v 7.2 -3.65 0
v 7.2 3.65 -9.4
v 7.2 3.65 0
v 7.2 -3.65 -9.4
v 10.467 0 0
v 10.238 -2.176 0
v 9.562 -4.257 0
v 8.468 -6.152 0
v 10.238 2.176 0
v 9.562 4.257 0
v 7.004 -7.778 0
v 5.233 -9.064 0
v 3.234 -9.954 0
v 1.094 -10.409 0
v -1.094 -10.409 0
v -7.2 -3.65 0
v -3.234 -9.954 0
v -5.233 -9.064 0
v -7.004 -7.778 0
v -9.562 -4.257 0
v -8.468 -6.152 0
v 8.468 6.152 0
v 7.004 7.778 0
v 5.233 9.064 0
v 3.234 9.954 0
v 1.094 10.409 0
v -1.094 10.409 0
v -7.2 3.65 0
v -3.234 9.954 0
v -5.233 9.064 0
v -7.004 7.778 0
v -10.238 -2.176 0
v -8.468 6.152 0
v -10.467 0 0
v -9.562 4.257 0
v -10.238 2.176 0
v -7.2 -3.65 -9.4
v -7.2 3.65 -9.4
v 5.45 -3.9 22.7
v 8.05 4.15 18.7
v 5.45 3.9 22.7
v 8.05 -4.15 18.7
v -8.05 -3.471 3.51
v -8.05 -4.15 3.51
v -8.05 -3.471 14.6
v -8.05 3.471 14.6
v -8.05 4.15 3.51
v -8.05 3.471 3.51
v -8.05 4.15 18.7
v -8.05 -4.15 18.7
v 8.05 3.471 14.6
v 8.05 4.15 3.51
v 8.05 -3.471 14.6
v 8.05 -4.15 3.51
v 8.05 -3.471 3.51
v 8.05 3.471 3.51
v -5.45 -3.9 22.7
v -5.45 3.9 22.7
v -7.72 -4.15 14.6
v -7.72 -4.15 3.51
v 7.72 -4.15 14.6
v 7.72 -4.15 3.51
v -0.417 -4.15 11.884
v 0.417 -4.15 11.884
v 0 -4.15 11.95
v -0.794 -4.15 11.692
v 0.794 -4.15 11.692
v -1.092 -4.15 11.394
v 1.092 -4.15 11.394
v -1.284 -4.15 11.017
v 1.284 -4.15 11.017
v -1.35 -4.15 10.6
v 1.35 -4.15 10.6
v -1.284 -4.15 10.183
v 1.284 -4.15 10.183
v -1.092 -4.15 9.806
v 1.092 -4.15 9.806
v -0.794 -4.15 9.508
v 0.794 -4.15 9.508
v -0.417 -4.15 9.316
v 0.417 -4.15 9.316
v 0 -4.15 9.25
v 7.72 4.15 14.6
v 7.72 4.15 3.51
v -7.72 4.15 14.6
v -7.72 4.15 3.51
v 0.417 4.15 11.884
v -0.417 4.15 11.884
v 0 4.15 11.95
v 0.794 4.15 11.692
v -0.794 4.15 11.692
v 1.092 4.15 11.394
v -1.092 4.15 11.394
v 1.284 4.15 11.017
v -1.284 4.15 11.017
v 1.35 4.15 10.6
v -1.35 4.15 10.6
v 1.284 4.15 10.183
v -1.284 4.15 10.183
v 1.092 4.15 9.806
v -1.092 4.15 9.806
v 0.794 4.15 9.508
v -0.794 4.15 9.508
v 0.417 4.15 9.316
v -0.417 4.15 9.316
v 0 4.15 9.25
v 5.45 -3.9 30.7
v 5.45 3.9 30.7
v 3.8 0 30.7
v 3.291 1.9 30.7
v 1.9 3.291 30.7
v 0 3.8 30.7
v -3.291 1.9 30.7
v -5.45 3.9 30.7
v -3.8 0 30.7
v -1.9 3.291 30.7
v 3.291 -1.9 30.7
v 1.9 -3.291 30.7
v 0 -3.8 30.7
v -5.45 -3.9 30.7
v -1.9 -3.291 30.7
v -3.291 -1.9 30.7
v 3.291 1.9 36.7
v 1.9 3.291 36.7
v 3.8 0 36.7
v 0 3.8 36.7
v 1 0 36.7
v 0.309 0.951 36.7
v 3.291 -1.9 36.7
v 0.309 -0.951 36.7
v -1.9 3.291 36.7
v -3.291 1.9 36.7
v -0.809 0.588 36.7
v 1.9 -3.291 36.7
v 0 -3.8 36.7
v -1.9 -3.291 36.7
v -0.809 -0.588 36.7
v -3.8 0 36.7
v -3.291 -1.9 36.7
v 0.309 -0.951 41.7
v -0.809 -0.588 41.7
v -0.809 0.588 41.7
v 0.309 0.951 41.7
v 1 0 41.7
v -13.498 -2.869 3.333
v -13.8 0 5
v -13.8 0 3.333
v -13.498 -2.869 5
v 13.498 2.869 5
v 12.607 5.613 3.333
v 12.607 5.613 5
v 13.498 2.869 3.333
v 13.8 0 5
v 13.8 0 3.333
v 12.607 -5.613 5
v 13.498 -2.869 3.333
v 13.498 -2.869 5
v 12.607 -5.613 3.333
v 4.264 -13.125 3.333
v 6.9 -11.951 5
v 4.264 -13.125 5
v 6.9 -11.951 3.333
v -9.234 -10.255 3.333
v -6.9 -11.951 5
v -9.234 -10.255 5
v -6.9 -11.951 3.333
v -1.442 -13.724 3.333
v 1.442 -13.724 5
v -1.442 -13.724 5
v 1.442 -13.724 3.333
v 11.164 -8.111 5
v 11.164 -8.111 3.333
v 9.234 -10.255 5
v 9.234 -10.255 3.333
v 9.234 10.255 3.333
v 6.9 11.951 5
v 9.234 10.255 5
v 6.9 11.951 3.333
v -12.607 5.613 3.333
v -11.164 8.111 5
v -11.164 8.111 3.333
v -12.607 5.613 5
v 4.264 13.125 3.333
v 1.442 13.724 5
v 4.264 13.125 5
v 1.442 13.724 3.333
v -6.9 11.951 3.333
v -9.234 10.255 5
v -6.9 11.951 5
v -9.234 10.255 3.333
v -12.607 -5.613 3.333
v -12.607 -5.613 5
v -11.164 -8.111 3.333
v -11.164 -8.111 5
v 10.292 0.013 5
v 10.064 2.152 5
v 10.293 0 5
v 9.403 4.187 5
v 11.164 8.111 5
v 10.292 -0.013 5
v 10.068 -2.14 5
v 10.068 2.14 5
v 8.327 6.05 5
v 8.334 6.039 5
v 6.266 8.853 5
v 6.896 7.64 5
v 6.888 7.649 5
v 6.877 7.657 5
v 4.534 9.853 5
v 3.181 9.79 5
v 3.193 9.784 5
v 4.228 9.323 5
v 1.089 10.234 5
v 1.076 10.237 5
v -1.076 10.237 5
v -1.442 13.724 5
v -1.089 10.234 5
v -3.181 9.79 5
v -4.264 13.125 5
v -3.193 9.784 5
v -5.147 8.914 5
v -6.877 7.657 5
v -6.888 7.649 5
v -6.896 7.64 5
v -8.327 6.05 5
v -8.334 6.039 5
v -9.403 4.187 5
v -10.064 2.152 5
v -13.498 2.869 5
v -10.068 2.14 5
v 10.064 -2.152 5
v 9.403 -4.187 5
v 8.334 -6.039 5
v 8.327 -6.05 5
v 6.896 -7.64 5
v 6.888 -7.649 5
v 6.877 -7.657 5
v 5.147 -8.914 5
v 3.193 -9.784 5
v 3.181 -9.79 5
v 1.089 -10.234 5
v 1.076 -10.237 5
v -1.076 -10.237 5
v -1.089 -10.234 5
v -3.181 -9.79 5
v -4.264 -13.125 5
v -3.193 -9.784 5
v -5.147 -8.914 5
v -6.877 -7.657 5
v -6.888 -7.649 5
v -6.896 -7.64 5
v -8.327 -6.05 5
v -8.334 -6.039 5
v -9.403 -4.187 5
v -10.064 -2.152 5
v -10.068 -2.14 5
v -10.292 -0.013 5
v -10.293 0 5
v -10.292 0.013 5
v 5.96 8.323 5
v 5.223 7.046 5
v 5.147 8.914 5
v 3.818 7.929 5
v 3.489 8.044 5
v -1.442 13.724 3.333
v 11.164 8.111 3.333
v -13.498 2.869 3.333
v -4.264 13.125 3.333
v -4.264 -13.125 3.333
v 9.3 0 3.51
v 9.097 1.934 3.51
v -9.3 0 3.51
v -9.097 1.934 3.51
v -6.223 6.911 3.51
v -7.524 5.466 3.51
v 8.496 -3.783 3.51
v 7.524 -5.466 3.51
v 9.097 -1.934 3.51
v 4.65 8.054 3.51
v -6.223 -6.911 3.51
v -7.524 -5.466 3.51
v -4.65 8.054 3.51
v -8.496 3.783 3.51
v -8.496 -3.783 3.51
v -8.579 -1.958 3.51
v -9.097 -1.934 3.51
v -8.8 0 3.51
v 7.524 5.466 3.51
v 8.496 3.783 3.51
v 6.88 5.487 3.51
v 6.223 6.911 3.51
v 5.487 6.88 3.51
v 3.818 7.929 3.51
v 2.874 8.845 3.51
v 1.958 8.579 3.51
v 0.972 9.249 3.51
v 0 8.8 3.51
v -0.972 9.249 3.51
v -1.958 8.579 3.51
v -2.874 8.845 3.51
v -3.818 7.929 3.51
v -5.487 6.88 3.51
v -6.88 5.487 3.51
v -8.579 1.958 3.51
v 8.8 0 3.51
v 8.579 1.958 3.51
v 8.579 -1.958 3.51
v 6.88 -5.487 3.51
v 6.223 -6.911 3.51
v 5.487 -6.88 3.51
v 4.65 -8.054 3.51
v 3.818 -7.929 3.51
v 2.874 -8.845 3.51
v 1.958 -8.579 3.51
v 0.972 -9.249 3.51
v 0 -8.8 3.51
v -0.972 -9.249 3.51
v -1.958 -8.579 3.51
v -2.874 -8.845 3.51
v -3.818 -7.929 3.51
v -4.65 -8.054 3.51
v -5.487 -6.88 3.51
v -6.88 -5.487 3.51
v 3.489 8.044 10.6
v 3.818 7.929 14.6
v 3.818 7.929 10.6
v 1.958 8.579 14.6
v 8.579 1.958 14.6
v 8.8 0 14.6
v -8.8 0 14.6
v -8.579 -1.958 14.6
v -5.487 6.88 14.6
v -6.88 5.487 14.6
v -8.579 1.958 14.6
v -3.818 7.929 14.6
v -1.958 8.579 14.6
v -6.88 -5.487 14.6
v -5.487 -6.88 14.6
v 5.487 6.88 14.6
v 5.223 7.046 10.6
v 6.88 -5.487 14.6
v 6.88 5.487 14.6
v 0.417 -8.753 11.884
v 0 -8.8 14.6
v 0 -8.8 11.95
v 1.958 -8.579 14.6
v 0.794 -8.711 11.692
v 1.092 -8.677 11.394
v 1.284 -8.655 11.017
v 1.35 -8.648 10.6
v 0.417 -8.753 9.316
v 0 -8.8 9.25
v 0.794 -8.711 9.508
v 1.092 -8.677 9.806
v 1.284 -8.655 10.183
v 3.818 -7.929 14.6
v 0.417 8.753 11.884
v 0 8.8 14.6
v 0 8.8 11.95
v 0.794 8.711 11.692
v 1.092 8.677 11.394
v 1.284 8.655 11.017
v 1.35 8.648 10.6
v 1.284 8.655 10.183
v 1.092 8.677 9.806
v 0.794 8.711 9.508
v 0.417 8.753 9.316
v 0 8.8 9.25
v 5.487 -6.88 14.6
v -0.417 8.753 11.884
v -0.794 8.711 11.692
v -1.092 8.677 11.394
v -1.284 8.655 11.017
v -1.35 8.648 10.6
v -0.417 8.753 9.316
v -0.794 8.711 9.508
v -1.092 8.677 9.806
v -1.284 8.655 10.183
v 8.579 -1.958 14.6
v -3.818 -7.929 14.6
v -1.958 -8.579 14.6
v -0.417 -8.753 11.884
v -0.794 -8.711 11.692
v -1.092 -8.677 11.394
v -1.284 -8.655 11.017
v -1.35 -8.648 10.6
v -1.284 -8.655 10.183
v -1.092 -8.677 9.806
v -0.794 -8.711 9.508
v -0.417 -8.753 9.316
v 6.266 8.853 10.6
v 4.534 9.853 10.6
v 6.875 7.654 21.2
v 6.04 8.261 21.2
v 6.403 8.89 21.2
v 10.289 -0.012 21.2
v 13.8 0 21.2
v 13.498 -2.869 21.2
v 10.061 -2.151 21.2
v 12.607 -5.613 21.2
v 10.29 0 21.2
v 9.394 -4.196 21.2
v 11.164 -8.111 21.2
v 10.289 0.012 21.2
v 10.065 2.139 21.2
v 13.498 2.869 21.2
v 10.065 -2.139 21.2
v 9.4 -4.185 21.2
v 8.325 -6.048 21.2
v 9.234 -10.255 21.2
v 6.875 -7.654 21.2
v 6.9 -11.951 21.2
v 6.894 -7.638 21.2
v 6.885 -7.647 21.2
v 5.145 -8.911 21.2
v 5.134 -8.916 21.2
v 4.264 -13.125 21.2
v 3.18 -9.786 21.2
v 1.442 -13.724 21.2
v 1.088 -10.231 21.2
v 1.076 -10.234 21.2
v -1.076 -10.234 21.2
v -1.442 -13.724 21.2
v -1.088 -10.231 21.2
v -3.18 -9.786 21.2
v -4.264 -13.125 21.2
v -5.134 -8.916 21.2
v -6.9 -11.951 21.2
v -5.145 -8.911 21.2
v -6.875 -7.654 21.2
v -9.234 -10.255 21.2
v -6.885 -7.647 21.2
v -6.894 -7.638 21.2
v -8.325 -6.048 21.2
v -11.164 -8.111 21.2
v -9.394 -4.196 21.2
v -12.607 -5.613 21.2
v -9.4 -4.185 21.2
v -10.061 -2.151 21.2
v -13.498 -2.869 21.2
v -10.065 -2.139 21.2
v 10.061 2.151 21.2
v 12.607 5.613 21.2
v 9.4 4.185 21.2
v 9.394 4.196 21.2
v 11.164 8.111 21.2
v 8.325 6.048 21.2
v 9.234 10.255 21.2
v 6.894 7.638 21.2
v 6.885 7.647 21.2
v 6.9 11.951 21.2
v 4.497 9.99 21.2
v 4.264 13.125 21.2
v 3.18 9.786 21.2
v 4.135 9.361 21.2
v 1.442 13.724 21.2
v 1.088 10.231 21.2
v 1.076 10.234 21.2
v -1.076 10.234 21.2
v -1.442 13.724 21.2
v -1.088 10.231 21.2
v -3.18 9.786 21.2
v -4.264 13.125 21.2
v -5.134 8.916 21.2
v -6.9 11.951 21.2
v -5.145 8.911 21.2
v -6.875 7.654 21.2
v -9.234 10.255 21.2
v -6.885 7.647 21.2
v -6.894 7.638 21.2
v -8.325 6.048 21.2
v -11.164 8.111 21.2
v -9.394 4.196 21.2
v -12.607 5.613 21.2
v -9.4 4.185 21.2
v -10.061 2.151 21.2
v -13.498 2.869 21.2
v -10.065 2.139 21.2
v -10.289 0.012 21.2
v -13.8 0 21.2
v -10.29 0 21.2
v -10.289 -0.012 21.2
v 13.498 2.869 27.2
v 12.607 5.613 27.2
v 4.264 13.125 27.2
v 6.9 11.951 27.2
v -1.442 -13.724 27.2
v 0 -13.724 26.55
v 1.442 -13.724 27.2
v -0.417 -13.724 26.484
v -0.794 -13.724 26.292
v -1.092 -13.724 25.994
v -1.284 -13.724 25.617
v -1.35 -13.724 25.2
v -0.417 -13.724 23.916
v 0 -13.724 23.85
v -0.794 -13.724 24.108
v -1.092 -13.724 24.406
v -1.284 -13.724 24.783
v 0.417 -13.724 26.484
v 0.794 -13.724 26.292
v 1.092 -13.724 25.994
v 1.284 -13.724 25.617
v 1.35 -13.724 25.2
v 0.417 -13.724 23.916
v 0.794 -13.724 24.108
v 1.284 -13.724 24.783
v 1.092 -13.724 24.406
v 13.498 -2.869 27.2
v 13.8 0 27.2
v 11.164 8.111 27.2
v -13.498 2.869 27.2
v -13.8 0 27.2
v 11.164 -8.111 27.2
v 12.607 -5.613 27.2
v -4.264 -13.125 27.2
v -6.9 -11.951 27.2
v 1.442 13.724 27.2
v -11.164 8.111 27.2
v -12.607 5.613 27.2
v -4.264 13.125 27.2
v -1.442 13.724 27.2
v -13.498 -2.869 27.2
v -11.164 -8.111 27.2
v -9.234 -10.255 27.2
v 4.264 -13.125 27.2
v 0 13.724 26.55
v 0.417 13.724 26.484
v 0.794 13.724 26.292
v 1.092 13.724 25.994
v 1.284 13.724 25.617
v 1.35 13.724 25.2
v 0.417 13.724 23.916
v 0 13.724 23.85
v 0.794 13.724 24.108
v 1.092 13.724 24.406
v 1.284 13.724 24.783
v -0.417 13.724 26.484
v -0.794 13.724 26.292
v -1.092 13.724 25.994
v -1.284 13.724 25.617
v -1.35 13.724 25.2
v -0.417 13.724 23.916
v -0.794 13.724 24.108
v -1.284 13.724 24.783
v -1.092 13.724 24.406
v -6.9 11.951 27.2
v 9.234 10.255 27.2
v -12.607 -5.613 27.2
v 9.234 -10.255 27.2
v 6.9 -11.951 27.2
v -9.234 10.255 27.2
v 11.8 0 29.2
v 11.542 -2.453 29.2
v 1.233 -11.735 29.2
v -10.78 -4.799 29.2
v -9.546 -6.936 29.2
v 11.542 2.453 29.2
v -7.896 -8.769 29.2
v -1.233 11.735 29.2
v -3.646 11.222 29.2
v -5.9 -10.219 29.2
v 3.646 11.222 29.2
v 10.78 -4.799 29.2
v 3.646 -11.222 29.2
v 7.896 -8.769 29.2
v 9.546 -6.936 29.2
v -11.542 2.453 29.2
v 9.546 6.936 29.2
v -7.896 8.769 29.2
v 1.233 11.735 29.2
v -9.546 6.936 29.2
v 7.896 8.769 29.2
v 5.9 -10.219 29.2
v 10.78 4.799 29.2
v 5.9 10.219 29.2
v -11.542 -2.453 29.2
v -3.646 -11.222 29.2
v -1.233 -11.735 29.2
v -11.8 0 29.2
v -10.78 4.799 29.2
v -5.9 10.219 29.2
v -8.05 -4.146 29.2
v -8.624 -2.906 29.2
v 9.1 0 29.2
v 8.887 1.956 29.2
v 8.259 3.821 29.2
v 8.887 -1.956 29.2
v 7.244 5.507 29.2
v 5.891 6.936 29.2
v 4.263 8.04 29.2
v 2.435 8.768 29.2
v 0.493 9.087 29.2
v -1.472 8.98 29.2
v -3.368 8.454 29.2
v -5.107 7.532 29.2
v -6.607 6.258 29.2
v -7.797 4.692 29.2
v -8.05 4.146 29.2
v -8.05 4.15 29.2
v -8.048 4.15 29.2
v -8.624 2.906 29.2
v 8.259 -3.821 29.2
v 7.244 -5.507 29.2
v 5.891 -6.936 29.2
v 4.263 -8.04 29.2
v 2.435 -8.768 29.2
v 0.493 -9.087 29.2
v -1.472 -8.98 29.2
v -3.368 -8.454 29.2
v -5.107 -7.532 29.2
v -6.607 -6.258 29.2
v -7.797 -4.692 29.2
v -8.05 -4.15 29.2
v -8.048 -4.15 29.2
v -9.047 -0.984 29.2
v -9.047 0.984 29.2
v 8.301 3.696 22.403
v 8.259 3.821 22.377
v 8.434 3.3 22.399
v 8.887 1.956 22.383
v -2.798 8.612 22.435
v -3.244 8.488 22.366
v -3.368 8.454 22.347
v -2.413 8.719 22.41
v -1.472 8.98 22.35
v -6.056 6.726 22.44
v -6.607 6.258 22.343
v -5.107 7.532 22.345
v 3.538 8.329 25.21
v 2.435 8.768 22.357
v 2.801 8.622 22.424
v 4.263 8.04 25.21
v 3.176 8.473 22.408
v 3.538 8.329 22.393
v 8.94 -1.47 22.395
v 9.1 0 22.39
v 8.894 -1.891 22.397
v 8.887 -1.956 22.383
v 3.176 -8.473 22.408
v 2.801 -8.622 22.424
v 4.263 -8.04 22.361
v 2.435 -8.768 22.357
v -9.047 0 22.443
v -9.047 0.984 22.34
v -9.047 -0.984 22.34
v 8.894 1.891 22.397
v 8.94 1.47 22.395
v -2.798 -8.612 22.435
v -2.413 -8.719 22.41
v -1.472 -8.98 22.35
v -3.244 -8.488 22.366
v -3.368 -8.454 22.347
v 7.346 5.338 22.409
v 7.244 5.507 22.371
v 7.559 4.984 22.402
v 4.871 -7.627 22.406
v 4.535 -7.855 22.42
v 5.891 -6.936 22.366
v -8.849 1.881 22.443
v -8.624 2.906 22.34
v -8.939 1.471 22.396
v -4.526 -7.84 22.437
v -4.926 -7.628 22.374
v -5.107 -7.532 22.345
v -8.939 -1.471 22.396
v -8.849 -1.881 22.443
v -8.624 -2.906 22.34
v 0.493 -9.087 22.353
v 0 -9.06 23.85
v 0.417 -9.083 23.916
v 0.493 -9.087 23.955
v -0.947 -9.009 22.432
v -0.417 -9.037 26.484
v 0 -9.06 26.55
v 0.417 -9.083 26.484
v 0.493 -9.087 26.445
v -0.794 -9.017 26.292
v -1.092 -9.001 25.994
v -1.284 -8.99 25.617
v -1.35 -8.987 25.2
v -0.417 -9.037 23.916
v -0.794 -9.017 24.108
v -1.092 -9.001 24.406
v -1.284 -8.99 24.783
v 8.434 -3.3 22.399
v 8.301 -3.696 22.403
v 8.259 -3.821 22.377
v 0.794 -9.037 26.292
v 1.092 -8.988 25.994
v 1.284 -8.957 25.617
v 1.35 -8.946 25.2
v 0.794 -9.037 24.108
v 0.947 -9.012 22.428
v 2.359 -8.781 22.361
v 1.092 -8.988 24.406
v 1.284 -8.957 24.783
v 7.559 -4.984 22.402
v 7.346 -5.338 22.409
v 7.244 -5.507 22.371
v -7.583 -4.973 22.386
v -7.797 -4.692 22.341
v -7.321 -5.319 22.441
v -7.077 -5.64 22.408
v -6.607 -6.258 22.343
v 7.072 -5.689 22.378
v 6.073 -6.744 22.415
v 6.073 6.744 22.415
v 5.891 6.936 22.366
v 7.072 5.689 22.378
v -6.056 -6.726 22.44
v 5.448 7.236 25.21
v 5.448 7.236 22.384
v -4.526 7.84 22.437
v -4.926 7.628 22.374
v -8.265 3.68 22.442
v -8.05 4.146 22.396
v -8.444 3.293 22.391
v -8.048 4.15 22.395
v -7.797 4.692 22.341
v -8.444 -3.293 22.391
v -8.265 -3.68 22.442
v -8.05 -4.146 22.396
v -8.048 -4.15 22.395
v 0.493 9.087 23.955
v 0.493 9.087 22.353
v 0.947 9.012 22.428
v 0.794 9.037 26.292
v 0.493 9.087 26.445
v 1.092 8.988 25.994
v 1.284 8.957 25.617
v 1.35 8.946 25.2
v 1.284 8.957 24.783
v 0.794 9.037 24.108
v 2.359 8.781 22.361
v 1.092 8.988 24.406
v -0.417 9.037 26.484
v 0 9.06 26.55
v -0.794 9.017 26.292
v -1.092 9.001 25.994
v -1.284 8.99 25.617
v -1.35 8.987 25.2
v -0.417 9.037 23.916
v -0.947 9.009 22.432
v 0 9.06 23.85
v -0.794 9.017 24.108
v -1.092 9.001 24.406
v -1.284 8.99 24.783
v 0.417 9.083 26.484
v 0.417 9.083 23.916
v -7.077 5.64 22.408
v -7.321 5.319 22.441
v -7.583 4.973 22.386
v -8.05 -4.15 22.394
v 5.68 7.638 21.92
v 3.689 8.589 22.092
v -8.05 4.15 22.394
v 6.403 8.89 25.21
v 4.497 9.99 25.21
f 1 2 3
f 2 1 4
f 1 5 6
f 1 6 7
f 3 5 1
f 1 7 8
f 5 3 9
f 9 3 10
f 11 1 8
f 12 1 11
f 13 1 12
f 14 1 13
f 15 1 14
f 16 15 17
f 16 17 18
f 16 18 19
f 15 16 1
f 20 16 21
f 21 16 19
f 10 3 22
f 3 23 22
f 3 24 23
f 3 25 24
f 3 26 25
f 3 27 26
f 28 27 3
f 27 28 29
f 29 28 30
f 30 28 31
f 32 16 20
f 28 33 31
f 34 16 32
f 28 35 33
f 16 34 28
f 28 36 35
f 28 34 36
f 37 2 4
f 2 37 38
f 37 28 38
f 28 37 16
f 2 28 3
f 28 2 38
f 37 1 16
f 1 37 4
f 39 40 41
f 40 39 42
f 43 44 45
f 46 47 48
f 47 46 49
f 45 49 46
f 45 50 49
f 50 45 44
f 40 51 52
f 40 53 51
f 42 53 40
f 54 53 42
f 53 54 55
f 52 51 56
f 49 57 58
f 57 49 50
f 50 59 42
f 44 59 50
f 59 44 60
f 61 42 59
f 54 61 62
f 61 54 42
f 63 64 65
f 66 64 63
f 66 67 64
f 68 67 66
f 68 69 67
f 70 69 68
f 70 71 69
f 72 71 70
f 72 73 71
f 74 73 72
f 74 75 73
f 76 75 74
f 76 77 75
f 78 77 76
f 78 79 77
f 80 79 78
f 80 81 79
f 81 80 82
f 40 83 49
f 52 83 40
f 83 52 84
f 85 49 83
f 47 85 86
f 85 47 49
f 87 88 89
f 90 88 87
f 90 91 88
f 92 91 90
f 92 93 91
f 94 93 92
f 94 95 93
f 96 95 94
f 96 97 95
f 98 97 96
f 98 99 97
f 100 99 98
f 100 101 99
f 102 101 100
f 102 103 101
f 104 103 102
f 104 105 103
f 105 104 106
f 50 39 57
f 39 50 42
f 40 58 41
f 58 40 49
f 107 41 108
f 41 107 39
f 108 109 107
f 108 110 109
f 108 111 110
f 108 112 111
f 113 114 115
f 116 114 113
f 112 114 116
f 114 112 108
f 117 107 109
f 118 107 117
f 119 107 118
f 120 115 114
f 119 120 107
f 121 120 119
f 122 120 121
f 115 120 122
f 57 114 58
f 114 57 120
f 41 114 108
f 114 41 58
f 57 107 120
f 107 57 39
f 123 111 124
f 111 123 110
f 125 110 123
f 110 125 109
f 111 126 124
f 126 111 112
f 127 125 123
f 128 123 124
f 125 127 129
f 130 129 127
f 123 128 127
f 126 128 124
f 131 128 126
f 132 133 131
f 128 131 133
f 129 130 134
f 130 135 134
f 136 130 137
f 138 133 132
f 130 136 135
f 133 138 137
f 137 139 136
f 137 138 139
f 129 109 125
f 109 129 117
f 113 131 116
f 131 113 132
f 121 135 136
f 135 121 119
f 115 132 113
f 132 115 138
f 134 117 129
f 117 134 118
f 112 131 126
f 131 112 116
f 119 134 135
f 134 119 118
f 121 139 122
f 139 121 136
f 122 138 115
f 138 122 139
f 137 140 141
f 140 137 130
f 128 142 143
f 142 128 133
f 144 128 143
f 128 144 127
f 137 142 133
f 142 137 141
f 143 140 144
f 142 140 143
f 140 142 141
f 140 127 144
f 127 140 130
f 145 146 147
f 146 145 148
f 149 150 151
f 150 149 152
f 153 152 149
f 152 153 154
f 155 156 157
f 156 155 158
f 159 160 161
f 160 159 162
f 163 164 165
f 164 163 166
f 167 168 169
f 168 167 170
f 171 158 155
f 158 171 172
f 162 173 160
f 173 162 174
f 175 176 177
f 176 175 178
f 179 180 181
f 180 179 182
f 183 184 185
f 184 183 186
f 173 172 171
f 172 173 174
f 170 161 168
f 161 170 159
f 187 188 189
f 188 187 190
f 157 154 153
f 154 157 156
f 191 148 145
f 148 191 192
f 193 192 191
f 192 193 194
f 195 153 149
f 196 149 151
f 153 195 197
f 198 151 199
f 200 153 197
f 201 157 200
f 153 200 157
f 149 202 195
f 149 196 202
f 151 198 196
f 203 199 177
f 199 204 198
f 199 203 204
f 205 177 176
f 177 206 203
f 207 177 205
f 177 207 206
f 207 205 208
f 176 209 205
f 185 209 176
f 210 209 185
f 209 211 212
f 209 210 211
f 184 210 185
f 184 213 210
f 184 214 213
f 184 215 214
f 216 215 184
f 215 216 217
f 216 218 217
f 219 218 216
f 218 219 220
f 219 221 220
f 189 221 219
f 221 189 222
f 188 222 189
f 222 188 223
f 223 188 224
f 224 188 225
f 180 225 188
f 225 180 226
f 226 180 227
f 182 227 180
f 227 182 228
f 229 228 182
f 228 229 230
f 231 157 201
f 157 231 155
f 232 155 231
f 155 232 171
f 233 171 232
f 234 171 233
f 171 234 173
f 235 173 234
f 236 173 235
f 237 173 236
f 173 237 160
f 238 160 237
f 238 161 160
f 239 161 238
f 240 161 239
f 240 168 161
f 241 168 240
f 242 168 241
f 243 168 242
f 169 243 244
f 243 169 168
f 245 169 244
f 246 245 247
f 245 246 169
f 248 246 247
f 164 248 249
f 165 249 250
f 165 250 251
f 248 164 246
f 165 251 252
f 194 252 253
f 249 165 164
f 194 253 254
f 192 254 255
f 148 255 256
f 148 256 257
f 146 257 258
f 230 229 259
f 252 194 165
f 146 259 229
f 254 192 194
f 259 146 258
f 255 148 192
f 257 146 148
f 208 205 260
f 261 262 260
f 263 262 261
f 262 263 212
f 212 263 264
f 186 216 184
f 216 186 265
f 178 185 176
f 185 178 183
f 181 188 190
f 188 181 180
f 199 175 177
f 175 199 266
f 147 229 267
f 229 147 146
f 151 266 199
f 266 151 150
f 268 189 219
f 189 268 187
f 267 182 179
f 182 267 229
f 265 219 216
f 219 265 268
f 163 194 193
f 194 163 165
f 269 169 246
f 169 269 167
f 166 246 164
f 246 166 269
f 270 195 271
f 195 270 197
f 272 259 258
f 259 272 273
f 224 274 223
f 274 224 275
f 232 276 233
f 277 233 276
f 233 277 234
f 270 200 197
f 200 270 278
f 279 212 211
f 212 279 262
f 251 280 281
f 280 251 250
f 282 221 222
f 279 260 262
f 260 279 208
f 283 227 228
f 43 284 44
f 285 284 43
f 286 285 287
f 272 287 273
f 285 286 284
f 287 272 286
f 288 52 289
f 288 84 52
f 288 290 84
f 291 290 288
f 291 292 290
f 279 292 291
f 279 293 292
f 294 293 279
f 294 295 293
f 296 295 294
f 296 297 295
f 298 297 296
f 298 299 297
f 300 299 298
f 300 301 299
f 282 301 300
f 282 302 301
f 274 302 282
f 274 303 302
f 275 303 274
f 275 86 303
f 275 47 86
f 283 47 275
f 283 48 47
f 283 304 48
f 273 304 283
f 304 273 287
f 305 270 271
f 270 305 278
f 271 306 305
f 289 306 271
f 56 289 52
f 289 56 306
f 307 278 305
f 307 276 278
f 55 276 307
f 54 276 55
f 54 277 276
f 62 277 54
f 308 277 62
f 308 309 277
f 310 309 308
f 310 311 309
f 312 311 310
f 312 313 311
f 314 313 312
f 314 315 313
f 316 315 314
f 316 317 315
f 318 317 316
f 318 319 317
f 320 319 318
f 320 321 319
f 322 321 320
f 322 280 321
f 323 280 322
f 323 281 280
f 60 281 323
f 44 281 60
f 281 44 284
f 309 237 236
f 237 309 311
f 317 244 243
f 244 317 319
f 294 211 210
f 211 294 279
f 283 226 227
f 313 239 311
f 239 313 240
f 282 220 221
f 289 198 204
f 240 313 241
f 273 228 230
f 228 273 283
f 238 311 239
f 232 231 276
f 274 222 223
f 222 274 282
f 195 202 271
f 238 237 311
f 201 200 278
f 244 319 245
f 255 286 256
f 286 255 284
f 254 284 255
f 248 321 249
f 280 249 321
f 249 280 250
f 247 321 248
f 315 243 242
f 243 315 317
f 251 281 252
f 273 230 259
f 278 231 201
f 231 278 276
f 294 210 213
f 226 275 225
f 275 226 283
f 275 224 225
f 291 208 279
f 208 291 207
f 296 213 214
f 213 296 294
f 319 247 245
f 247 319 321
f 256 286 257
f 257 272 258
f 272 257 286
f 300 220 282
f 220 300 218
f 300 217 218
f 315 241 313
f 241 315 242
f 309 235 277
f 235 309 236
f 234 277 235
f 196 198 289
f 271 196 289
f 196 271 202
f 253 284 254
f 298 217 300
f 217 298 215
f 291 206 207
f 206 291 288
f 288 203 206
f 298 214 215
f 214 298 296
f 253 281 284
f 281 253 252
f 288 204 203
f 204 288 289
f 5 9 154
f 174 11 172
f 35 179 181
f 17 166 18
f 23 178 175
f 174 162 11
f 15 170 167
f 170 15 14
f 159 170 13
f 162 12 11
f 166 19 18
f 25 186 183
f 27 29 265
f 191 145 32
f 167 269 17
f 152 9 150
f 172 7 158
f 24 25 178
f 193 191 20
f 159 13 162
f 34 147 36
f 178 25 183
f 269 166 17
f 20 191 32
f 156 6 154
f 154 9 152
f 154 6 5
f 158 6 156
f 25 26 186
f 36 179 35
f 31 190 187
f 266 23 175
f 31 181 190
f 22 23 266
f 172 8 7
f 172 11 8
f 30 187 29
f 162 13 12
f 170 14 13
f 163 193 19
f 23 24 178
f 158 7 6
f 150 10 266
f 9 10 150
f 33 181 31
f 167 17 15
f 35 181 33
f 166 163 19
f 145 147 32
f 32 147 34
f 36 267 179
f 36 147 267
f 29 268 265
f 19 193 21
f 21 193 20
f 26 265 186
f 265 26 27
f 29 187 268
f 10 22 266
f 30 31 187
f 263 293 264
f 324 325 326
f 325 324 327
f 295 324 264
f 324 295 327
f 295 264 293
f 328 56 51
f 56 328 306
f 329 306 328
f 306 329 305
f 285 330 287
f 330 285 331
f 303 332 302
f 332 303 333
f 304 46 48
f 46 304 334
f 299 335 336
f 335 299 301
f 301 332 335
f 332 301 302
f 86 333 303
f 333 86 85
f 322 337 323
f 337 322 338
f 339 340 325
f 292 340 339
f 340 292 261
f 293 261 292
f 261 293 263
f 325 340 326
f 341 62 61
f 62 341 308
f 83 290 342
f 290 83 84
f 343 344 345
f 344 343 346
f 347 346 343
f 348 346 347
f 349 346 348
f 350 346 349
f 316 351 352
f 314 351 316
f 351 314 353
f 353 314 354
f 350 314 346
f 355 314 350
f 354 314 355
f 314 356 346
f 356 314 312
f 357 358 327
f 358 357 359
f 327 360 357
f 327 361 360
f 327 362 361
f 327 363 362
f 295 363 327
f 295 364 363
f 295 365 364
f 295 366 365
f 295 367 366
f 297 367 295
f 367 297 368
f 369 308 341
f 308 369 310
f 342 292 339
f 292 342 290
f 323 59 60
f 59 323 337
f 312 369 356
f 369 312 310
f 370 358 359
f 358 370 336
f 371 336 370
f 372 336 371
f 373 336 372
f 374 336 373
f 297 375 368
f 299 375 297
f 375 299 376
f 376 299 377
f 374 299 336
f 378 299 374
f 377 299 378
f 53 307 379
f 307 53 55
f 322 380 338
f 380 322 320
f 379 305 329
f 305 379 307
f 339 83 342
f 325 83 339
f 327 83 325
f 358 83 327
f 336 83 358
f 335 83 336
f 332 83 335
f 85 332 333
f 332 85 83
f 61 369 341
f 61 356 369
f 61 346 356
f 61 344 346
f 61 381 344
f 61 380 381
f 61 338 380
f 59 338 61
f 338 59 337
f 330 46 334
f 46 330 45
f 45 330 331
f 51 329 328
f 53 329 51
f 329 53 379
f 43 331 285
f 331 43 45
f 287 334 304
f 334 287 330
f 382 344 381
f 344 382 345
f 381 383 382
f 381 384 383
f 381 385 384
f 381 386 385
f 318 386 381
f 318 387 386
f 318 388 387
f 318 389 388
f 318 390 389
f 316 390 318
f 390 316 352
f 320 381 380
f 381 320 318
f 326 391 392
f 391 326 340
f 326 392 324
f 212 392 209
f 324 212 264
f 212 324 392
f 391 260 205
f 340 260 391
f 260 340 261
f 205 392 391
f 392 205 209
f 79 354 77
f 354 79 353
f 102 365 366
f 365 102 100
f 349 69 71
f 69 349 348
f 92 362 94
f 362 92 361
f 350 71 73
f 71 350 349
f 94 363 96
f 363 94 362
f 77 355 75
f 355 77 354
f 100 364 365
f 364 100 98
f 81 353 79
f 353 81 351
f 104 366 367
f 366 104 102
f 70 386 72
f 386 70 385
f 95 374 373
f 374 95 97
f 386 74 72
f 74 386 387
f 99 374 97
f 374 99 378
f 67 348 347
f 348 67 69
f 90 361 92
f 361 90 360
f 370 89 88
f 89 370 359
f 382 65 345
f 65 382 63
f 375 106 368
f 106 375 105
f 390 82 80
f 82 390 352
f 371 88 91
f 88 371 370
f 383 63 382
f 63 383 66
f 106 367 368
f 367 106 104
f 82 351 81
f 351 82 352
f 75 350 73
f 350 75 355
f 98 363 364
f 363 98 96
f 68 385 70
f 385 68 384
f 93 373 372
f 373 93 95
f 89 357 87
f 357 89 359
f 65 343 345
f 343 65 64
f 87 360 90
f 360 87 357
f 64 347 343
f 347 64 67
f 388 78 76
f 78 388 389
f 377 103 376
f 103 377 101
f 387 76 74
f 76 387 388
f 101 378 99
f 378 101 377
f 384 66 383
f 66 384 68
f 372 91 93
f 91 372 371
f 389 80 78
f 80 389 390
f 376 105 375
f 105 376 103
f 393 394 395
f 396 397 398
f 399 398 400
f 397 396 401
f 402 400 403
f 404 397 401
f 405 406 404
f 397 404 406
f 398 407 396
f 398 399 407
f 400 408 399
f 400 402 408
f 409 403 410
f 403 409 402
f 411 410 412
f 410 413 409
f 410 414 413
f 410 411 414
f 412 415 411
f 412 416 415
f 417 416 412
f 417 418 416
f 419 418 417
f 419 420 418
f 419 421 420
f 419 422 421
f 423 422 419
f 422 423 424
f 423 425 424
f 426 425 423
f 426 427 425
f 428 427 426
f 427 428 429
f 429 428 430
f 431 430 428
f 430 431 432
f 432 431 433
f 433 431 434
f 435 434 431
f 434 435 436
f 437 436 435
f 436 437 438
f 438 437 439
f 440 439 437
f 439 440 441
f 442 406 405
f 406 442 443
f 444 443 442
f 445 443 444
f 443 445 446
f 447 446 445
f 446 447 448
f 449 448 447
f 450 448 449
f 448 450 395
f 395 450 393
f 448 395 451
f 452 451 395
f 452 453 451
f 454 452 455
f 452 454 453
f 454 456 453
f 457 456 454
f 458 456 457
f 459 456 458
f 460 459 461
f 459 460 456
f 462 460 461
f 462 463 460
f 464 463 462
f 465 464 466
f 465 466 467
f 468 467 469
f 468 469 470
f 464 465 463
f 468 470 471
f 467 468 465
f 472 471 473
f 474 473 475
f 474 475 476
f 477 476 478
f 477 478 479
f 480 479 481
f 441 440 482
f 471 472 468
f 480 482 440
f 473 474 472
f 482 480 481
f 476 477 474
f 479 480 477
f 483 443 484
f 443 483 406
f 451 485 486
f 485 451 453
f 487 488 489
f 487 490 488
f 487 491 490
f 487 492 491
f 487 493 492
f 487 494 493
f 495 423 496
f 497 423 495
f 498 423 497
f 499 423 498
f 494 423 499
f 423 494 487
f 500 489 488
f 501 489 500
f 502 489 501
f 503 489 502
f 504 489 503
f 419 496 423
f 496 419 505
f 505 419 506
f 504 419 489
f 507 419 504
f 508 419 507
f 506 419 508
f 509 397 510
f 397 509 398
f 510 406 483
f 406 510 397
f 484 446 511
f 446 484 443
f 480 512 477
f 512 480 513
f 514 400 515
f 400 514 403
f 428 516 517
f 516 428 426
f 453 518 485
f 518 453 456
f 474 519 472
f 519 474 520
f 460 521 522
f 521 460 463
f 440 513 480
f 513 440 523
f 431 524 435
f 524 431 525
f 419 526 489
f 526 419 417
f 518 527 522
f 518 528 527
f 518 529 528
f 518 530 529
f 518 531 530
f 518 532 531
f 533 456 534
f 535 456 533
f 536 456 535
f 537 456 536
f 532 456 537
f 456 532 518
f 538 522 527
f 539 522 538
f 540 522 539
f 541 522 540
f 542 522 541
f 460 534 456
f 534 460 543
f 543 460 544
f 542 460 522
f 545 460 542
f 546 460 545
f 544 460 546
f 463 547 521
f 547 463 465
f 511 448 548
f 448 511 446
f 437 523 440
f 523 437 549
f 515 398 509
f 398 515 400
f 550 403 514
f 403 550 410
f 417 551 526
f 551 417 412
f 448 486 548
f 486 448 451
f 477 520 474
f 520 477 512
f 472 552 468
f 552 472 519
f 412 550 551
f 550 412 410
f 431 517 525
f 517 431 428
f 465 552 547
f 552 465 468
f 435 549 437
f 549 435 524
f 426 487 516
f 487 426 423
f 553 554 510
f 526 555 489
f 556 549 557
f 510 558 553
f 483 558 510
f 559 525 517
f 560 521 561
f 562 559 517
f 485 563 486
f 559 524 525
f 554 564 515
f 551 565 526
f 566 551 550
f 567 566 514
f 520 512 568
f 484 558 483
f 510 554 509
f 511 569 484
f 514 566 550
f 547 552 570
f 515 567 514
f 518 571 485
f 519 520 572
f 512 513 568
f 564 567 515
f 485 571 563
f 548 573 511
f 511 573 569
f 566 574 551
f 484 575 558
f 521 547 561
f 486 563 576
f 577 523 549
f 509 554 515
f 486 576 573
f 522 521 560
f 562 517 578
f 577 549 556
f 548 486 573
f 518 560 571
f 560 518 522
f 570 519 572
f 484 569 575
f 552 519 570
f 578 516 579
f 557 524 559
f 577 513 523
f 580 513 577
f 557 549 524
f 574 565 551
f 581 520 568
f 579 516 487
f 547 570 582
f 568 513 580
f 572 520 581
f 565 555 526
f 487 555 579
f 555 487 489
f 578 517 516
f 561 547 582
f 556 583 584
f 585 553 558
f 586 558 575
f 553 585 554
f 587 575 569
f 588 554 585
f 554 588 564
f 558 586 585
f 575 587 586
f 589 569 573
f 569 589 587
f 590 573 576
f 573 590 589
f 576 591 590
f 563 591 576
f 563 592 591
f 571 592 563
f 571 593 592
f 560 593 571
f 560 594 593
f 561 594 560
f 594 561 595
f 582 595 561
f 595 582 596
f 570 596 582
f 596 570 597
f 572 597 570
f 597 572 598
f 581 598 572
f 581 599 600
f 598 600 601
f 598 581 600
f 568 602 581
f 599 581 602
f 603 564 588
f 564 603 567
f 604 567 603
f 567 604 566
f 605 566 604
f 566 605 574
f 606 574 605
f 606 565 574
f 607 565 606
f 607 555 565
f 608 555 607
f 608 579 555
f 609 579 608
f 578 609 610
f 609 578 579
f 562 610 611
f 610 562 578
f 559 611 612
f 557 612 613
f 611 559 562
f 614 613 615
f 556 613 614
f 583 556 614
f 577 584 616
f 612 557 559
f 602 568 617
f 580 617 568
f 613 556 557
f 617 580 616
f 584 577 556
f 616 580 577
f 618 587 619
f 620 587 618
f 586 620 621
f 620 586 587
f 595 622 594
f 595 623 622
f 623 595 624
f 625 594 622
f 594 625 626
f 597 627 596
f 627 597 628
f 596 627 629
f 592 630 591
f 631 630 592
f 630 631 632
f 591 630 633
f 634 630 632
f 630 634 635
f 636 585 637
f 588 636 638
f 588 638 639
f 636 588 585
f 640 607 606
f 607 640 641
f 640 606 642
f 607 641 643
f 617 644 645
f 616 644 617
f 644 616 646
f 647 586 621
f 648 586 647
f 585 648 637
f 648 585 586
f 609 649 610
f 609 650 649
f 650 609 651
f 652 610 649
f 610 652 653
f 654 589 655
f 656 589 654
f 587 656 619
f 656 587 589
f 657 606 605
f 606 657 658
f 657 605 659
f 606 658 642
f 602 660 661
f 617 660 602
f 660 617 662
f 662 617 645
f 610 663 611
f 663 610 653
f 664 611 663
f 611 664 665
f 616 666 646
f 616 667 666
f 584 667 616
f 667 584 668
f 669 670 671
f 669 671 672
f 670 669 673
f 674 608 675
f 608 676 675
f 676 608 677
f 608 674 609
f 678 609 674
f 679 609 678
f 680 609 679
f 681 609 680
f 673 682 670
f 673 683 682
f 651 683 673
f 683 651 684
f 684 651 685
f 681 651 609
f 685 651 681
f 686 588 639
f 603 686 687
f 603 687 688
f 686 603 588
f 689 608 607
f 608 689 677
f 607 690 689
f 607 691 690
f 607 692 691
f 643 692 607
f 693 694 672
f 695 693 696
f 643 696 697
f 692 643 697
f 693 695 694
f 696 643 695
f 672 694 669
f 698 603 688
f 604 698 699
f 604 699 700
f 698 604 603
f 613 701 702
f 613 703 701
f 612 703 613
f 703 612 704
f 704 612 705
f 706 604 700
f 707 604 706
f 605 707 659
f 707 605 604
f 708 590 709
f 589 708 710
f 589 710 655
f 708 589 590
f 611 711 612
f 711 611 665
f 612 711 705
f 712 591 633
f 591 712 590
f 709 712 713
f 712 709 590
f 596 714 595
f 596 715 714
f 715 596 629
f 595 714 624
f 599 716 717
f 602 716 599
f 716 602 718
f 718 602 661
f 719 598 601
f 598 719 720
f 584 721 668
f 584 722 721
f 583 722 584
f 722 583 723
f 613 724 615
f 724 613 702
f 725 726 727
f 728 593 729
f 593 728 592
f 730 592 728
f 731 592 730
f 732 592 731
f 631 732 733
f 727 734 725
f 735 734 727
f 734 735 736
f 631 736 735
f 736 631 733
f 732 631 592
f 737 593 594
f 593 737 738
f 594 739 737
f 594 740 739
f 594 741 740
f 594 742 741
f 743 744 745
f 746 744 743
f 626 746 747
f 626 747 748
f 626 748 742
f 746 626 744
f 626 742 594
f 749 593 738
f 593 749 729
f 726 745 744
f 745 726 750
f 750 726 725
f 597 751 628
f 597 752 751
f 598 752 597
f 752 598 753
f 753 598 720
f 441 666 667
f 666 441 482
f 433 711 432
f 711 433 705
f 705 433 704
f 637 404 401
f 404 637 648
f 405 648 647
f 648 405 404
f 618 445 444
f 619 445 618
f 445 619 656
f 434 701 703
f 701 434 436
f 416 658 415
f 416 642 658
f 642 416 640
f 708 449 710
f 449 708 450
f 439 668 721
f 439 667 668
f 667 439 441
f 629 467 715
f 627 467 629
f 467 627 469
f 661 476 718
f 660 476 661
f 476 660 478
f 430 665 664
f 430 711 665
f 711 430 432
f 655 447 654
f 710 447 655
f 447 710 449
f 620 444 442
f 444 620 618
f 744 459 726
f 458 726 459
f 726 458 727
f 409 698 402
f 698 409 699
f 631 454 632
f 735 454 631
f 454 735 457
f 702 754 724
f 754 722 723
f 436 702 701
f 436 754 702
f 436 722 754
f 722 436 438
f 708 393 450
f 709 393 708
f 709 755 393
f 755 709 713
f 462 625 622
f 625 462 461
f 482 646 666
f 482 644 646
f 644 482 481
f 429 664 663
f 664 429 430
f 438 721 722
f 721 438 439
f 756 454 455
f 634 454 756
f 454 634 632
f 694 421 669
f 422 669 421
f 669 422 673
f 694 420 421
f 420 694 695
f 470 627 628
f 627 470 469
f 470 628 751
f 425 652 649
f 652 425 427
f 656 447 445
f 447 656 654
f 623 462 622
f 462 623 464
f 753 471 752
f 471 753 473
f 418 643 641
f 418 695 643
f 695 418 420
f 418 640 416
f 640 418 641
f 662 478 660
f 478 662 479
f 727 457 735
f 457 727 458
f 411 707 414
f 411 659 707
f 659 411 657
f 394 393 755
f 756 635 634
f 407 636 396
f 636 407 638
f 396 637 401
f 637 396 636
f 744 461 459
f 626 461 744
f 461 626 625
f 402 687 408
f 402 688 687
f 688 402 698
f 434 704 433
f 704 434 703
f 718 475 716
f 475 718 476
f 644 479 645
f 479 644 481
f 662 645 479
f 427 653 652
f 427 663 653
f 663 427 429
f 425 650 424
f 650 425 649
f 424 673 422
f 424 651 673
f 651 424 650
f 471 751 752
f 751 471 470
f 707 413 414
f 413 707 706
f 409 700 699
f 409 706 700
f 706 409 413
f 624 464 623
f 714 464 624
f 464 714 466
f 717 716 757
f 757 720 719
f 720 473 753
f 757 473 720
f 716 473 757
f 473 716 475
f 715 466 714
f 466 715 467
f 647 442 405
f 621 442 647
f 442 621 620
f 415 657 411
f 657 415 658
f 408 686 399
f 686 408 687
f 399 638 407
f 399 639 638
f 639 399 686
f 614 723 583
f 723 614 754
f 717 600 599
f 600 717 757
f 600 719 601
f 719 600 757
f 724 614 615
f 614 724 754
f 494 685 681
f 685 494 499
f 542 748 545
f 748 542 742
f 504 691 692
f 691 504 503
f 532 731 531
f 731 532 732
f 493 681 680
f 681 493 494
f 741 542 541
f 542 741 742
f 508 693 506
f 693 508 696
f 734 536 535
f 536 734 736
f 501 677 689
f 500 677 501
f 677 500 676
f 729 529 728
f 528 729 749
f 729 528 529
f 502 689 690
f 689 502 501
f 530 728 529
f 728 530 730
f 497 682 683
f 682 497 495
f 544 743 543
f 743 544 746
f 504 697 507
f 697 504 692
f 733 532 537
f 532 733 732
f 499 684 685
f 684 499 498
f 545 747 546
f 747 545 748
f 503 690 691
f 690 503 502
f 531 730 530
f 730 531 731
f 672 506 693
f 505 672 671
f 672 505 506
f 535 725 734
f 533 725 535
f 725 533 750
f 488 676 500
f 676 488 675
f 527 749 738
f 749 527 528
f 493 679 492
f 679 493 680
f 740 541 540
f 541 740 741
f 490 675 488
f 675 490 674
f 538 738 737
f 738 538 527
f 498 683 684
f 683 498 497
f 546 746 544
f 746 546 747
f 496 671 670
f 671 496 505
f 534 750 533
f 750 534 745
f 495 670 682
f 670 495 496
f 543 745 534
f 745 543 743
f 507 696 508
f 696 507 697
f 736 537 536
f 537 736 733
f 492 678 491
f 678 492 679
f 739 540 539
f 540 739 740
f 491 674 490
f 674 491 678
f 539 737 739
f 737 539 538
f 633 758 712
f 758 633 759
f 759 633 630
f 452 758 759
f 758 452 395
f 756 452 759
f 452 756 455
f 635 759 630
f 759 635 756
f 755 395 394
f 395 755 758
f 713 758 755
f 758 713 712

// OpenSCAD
//Makes a hole grommet that a USB cable plug or socket can be jammed into.
//Locking ring has a side screw to hold it, and clamp USB connector
// anti-rotation key provided
/*[Global]*/
//Choose Which parts to show
Show="all"; //[all,flange,ring,usb]

//Choose the view
//View="printable"; //[assembly, exploded, printable]
//View="assembly";
View="exploded"; //[assembly, exploded, printable]

//Display USB Plug
ViewUSB="showusb"; //[showusb,hideusb]

/*[Panel]*/
//Diameter of hole that grommet goes through
MountingHoleD=17.6;

HoleR=MountingHoleD/2;

//Thickness of case material - small burring is OK as a broove is provided for it
PanelH=1.6;
//inside suffers from a raised edge from drilling, so recess it
PanelBurrBevel=1.5;

//correction for holes being small on UP printer
holeos=0.3;

/*[Flange]*/
//Outside Flange is bigger than Mounting Hole by this much (each side)
FlangeW=5;

FlangeOR=(MountingHoleD+FlangeW*2) /2;

FlangeH=FlangeW;
FlangeBevel=FlangeW*2/3;

//width of anti-rotation key tit. Set to 0 to not have it. (or just cut it off)
KeyW=2;
//Height of key above panel thickness, i.e. into ring
KeyH=4;

/*[Ring]*/
//Thickness of the internal Ring part (protrusion into the internal space)
InternalH=8;
//diameter of screw holes that screw ring to flange and locks USB in place. (Length of screw is shown on console)
ScrewD=2.4;
ScrewIR=(ScrewD+holeos)/2;

/*[USB]*/
//Size of USB plug moulding at widest part - this is a compression fit
USBX=16.1;
USBY=8.3;
//How to Grip the USB plug: Everything below here is relevant to positive retention only, for compression+screw you can ignore it.
USBGripStyle="compression"; //[compression, positive-not-implemented]
//Moulding length at main width. Only used when using positive restention
USBZ=18.7;
//Length of tapering moulding back to narrow rectangle part
USBZ1=4;
//Smaller rectangle before strain relief
USBZ2=8;
USBY2=7.8;
USBX2=10.9;
//diameter at the strain relief
USBReliefD=7.6;
USBReliefR=USBReliefD/2;
USBReliefZ=6;
//diameter of the cable
USBCableD=4/2;
USBCableR=USBCableD/2;
USBCableZ=5;

//Select Male or Female USB socket 
USBGender="female"; //[male,female]
//USBGender="female";
//Dimensions of metal part. 
USBMaleX=12.2;
USBMaleY=4.6;
USBMaleZ=12.8;

USBFemaleX=14.4;
USBFemaleY=7.3;
USBFemaleZ=9.4;

//-------------
H=PanelH+InternalH+FlangeH;


echo(str("Screw thread length = ", FlangeOR-USBY/2,"mm"));
echo(str("Flange Diameter = ",FlangeOR*2,"mm"));

//Make a cube which is centred on some axes
//center can be xy,x,y,z,true, 
// if ends with "-" then extends Z and offsets, for use in differences
module cubec(size=1, center="xy", offset=[0,0,0]) {
//    //if (center[len(center)-1] =="-") { 
//    if (offset=="-") {
//        size=size+[0, 0, .02];
//        //offset=offset - [0, 0, 0.01];
//         offset = [0, 0, 0.01];
//    }//if
// 
    if (center=="xy")  translate( offset + [-size[0]/2, -size[1]/2, 0]) cube(size);
    if (center=="x")   translate(offset+[-size[0]/2, 0, 0]) cube(size);
    if (center=="y")   translate(offset+[0, -size[1]/2, 0]) cube(size);
    if (center=="z")   translate(offset+[0,0,-size[2]/2]) cube(size);
    if (center==true || center=="xyz") translate(-size/2) cube(size);      
}//mod


module USBHole() {
    cubec([USBX,USBY,H+0.02],center="xy", offset=[0,0,-0.01]);
}//mod

//makes a USB plug shape
module USBPlug() {
    if (USBGender=="male") {
            translate([0,0,-USBMaleZ]) cubec([USBMaleX,USBMaleY,USBMaleZ],center="xy");
    }else{
            translate([0,0,-USBFemaleZ]) cubec([USBFemaleX,USBFemaleY,USBFemaleZ],center="xy");
    }//if
        
    hull() {
    cubec([USBX,USBY,USBZ],center="xy");
    translate([0,0,USBZ]) cubec([USBX2,USBY2,USBZ1],center="xy");
    }
    translate([0,0,USBZ+USBZ1]) cubec([USBX2,USBY2,USBZ2],center="xy");
    translate([0,0,USBZ+USBZ1+USBZ2]) cylinder(r=USBReliefR, h=USBReliefZ);
    translate([0,0,USBZ+USBZ1+USBZ2+USBReliefZ]) cylinder(r=USBCableR, h=USBCableZ);
}//mod

module Screw() {
    rotate([90,0,0]) cylinder(r=ScrewIR, h=FlangeOR*2+5,$fn=20,center=true);
}

//------------------------------------------------------------

module FlangePart() {
   color("red") 
difference() {    
    union() {
        //flange
        cylinder(r1=FlangeOR-FlangeBevel, r2=FlangeOR, h=FlangeBevel); 
        difference() {
            translate([0,0, FlangeBevel]) 
                cylinder(r=FlangeOR, h=FlangeH-FlangeBevel);
                translate([0,0,FlangeH-PanelBurrBevel+0.01]) cylinder(r1=HoleR+0.5, r2=HoleR+PanelBurrBevel, h=PanelBurrBevel);    
        }//diff
        //rod
        cylinder(r=HoleR, h=H);
        rotate([0,0,60]) translate([HoleR,0,FlangeH]) 
                cubec([KeyW*2,KeyW,KeyH+PanelH],center="xy");
    }//union
    USBHole();
    translate([0,0,FlangeH+PanelH+InternalH/2]) Screw();
    
}//diff 
}//mod

module Ring() {
        difference() {
        union() {
         cylinder(r=FlangeOR, h=InternalH*3/4);
         translate([0,0,InternalH*3/4]) cylinder(r1=FlangeOR,r2=FlangeOR-InternalH/4, h=InternalH/4);   
        }//union   
         USBHole();
         translate([0,0,-0.01]) {
             cylinder(r=HoleR+holeos, h=H+0.01);
             cylinder(r2=HoleR, r1=HoleR+PanelBurrBevel, h=PanelBurrBevel);    
         }
         translate([0,0,InternalH/2]) Screw(); //screw holes
         rotate([0,0,60]) translate([HoleR,0,-0.01]) 
                cubec([KeyW*2+0.2,KeyW+0.2,KeyH+0.02],center="xy"); //key slot
    }
}//mod



//Main
if ((ViewUSB=="showusb" && View!="printable") || Show=="usb") color("lightgreen") 
    if (View=="exploded") {
            translate([0,0,H+FlangeH+PanelH]+20) USBPlug();
    }else{
        USBPlug();
    }

if (Show=="all" || Show=="flange")  FlangePart();

if (Show=="all" || Show=="ring")
     color("cyan")
    if (View=="assembly") {
        translate([0,0,FlangeH+PanelH]) Ring();  
    } else {
         if (View=="exploded") {
            translate([0,0,H+FlangeH+PanelH]) Ring();  
         }else {
            translate([FlangeOR*2+5,0,InternalH]) rotate([0,180,0]) Ring();  //ready to print
         }
    }
